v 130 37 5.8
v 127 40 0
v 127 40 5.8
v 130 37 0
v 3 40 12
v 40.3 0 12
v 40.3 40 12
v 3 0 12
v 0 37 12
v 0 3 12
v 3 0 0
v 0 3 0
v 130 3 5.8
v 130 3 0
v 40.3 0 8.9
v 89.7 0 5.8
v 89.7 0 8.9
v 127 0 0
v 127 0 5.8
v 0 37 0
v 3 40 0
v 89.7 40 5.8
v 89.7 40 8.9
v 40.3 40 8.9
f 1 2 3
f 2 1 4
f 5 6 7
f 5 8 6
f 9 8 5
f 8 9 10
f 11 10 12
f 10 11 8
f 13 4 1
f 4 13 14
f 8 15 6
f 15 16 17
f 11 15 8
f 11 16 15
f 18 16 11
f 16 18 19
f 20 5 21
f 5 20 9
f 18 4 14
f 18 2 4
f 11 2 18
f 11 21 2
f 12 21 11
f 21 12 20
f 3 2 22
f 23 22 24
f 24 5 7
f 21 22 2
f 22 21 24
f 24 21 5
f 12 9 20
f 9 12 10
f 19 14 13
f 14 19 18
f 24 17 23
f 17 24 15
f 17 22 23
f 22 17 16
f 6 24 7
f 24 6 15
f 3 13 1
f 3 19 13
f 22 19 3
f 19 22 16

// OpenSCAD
$fn = 32;

// ----------------------------------------------------------------------
// Stepped bar: twostep, 130 x 40 x 12/5.8 mm
// ----------------------------------------------------------------------

// --- parameters (mm) ---
bar_l = 130;              // bar length, X
bar_w = 40;               // bar width, Y
plate_t = 12;             // thickness of the thick zone, Z
thin_t = 5.8;             // thickness of the thin zone
corner_c = 3;             // corner chamfer of the bar
step_cut = 6.2;           // material removed from the thin zone
stair1_x = 40.3;          // position of the first stair
stair2_x = 89.7;          // position of the second stair
mid_t = 8.9;              // thickness of the middle zone
depth_1 = 3.1;            // depth of cut 1 from the top face
depth_2 = 6.2;            // depth of cut 2 from the top face
fit_tol = 0.1;            // declared fit tolerance (prompt contract)
free_tol = 0.5;           // declared free tolerance (prompt contract)

profile = [[3, 0], [127, 0], [130, 3], [130, 37], [127, 40], [3, 40], [0, 37], [0, 3]];  // primary outline, 8 points, counter clockwise
void_1 = [[40.3, -1], [89.7, -1], [89.7, 41], [40.3, 41]];  // first stair, 4 points
void_2 = [[89.7, -1], [131, -1], [131, 41], [89.7, 41]];  // second stair, 4 points

// --- the one profile operation ---
difference() {
  linear_extrude(height = plate_t) polygon(points = profile);
  translate([0, 0, plate_t - depth_1])
    linear_extrude(height = depth_1 + 1) polygon(points = void_1);
  translate([0, 0, plate_t - depth_2])
    linear_extrude(height = depth_2 + 1) polygon(points = void_2);
}
